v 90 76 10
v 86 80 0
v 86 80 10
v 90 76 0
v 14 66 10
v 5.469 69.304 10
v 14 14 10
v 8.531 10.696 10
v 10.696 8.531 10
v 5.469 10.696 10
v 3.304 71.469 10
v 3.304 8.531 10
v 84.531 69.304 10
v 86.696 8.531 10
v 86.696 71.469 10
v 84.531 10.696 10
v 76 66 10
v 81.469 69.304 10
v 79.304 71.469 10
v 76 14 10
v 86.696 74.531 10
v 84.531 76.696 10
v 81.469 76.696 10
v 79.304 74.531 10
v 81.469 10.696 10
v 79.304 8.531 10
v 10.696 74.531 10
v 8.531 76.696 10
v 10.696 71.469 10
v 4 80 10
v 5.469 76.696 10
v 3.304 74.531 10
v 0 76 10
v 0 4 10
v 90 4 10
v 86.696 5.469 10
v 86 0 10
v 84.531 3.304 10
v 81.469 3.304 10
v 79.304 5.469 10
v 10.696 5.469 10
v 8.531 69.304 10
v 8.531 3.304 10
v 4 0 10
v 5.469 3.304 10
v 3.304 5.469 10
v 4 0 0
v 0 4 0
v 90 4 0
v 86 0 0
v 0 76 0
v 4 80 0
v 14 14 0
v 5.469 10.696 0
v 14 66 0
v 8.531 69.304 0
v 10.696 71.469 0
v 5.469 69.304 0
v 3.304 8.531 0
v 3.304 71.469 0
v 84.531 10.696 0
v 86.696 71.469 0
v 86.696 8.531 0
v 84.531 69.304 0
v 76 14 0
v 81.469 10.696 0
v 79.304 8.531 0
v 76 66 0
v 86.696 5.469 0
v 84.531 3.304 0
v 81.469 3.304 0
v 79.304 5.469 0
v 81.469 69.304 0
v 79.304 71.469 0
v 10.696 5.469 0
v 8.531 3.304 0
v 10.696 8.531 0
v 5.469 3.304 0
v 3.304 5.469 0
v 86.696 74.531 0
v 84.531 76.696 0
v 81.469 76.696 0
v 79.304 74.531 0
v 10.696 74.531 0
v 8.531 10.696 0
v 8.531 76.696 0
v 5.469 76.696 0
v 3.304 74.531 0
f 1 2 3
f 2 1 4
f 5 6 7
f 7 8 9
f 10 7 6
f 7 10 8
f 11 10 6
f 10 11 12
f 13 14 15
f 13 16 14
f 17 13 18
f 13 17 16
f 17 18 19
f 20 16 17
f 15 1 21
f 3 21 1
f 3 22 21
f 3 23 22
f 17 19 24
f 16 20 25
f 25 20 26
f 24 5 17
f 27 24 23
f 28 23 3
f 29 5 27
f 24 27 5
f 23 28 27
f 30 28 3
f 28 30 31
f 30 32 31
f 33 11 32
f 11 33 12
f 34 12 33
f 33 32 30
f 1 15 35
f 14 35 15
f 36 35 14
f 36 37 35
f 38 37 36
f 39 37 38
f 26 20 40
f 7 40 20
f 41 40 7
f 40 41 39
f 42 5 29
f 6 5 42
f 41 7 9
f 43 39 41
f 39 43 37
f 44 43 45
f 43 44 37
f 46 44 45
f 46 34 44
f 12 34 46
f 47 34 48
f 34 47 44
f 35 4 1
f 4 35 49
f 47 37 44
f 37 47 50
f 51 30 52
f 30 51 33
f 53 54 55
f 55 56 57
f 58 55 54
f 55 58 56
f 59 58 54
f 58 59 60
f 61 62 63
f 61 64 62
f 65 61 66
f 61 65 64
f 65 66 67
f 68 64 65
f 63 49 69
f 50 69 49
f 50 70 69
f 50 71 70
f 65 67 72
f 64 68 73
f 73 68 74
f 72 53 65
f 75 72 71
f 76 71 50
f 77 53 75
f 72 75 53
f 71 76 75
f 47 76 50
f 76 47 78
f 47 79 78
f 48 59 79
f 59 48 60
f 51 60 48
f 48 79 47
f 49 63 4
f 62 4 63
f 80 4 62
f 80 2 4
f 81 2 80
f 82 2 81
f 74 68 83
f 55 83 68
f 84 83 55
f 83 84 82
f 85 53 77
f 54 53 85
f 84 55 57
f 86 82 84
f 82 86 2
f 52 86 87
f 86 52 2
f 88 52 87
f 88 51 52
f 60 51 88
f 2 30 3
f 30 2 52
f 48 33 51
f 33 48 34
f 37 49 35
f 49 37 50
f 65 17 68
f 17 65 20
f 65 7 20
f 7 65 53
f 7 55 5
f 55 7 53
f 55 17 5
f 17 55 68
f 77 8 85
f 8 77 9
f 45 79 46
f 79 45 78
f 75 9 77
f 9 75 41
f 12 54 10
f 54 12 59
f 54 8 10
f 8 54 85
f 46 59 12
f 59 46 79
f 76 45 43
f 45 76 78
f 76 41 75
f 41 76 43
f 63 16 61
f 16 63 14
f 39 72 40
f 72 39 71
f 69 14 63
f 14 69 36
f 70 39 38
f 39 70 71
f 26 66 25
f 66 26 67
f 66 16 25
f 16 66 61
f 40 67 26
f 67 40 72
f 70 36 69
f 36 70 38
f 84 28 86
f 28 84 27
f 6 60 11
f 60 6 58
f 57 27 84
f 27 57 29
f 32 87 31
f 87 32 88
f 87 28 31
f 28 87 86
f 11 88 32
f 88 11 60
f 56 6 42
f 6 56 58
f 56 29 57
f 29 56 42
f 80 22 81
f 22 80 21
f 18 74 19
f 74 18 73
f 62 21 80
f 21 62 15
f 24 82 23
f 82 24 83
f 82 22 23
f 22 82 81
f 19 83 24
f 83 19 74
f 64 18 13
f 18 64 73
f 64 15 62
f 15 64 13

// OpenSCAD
$fn = 32;

// ----------------------------------------------------------------------
// Frame plate: 90 x 80 frame, 14 mm rails
// ----------------------------------------------------------------------

// --- parameters (mm) ---
plate_l = 90;             // plate length, X
plate_w = 80;             // plate width, Y
plate_t = 10;             // plate thickness, Z (extrusion height)
corner_c = 4;             // corner chamfer
frame_bar = 14;           // frame rail width
bolt_r = 4;               // corner bolt window radius
bolt_inset = 7;           // bolt centre inset from the edges

win_l = plate_l - 2 * frame_bar;  // window length
win_w = plate_w - 2 * frame_bar;  // window width
bolt_d = 2 * bolt_r;  // corner hole diameter

profile = [[4, 0], [86, 0], [90, 4], [90, 76], [86, 80], [4, 80], [0, 76], [0, 4]];  // primary outline, 8 points, counter clockwise
void_1 = [[14, 14], [76, 14], [76, 66], [14, 66]];  // the window, 4 points
void_2 = [[10.696, 8.531], [8.531, 10.696], [5.469, 10.696], [3.304, 8.531], [3.304, 5.469], [5.469, 3.304], [8.531, 3.304], [10.696, 5.469]];  // corner bolt window, 8 points
void_3 = [[86.696, 8.531], [84.531, 10.696], [81.469, 10.696], [79.304, 8.531], [79.304, 5.469], [81.469, 3.304], [84.531, 3.304], [86.696, 5.469]];  // corner bolt window, 8 points
void_4 = [[10.696, 74.531], [8.531, 76.696], [5.469, 76.696], [3.304, 74.531], [3.304, 71.469], [5.469, 69.304], [8.531, 69.304], [10.696, 71.469]];  // corner bolt window, 8 points
void_5 = [[86.696, 74.531], [84.531, 76.696], [81.469, 76.696], [79.304, 74.531], [79.304, 71.469], [81.469, 69.304], [84.531, 69.304], [86.696, 71.469]];  // corner bolt window, 8 points

// --- the one profile operation ---
difference() {
  linear_extrude(height = plate_t) polygon(points = profile);
  translate([0, 0, -1])
    linear_extrude(height = plate_t + 2) polygon(points = void_1);
  translate([0, 0, -1])
    linear_extrude(height = plate_t + 2) polygon(points = void_2);
  translate([0, 0, -1])
    linear_extrude(height = plate_t + 2) polygon(points = void_3);
  translate([0, 0, -1])
    linear_extrude(height = plate_t + 2) polygon(points = void_4);
  translate([0, 0, -1])
    linear_extrude(height = plate_t + 2) polygon(points = void_5);
}
